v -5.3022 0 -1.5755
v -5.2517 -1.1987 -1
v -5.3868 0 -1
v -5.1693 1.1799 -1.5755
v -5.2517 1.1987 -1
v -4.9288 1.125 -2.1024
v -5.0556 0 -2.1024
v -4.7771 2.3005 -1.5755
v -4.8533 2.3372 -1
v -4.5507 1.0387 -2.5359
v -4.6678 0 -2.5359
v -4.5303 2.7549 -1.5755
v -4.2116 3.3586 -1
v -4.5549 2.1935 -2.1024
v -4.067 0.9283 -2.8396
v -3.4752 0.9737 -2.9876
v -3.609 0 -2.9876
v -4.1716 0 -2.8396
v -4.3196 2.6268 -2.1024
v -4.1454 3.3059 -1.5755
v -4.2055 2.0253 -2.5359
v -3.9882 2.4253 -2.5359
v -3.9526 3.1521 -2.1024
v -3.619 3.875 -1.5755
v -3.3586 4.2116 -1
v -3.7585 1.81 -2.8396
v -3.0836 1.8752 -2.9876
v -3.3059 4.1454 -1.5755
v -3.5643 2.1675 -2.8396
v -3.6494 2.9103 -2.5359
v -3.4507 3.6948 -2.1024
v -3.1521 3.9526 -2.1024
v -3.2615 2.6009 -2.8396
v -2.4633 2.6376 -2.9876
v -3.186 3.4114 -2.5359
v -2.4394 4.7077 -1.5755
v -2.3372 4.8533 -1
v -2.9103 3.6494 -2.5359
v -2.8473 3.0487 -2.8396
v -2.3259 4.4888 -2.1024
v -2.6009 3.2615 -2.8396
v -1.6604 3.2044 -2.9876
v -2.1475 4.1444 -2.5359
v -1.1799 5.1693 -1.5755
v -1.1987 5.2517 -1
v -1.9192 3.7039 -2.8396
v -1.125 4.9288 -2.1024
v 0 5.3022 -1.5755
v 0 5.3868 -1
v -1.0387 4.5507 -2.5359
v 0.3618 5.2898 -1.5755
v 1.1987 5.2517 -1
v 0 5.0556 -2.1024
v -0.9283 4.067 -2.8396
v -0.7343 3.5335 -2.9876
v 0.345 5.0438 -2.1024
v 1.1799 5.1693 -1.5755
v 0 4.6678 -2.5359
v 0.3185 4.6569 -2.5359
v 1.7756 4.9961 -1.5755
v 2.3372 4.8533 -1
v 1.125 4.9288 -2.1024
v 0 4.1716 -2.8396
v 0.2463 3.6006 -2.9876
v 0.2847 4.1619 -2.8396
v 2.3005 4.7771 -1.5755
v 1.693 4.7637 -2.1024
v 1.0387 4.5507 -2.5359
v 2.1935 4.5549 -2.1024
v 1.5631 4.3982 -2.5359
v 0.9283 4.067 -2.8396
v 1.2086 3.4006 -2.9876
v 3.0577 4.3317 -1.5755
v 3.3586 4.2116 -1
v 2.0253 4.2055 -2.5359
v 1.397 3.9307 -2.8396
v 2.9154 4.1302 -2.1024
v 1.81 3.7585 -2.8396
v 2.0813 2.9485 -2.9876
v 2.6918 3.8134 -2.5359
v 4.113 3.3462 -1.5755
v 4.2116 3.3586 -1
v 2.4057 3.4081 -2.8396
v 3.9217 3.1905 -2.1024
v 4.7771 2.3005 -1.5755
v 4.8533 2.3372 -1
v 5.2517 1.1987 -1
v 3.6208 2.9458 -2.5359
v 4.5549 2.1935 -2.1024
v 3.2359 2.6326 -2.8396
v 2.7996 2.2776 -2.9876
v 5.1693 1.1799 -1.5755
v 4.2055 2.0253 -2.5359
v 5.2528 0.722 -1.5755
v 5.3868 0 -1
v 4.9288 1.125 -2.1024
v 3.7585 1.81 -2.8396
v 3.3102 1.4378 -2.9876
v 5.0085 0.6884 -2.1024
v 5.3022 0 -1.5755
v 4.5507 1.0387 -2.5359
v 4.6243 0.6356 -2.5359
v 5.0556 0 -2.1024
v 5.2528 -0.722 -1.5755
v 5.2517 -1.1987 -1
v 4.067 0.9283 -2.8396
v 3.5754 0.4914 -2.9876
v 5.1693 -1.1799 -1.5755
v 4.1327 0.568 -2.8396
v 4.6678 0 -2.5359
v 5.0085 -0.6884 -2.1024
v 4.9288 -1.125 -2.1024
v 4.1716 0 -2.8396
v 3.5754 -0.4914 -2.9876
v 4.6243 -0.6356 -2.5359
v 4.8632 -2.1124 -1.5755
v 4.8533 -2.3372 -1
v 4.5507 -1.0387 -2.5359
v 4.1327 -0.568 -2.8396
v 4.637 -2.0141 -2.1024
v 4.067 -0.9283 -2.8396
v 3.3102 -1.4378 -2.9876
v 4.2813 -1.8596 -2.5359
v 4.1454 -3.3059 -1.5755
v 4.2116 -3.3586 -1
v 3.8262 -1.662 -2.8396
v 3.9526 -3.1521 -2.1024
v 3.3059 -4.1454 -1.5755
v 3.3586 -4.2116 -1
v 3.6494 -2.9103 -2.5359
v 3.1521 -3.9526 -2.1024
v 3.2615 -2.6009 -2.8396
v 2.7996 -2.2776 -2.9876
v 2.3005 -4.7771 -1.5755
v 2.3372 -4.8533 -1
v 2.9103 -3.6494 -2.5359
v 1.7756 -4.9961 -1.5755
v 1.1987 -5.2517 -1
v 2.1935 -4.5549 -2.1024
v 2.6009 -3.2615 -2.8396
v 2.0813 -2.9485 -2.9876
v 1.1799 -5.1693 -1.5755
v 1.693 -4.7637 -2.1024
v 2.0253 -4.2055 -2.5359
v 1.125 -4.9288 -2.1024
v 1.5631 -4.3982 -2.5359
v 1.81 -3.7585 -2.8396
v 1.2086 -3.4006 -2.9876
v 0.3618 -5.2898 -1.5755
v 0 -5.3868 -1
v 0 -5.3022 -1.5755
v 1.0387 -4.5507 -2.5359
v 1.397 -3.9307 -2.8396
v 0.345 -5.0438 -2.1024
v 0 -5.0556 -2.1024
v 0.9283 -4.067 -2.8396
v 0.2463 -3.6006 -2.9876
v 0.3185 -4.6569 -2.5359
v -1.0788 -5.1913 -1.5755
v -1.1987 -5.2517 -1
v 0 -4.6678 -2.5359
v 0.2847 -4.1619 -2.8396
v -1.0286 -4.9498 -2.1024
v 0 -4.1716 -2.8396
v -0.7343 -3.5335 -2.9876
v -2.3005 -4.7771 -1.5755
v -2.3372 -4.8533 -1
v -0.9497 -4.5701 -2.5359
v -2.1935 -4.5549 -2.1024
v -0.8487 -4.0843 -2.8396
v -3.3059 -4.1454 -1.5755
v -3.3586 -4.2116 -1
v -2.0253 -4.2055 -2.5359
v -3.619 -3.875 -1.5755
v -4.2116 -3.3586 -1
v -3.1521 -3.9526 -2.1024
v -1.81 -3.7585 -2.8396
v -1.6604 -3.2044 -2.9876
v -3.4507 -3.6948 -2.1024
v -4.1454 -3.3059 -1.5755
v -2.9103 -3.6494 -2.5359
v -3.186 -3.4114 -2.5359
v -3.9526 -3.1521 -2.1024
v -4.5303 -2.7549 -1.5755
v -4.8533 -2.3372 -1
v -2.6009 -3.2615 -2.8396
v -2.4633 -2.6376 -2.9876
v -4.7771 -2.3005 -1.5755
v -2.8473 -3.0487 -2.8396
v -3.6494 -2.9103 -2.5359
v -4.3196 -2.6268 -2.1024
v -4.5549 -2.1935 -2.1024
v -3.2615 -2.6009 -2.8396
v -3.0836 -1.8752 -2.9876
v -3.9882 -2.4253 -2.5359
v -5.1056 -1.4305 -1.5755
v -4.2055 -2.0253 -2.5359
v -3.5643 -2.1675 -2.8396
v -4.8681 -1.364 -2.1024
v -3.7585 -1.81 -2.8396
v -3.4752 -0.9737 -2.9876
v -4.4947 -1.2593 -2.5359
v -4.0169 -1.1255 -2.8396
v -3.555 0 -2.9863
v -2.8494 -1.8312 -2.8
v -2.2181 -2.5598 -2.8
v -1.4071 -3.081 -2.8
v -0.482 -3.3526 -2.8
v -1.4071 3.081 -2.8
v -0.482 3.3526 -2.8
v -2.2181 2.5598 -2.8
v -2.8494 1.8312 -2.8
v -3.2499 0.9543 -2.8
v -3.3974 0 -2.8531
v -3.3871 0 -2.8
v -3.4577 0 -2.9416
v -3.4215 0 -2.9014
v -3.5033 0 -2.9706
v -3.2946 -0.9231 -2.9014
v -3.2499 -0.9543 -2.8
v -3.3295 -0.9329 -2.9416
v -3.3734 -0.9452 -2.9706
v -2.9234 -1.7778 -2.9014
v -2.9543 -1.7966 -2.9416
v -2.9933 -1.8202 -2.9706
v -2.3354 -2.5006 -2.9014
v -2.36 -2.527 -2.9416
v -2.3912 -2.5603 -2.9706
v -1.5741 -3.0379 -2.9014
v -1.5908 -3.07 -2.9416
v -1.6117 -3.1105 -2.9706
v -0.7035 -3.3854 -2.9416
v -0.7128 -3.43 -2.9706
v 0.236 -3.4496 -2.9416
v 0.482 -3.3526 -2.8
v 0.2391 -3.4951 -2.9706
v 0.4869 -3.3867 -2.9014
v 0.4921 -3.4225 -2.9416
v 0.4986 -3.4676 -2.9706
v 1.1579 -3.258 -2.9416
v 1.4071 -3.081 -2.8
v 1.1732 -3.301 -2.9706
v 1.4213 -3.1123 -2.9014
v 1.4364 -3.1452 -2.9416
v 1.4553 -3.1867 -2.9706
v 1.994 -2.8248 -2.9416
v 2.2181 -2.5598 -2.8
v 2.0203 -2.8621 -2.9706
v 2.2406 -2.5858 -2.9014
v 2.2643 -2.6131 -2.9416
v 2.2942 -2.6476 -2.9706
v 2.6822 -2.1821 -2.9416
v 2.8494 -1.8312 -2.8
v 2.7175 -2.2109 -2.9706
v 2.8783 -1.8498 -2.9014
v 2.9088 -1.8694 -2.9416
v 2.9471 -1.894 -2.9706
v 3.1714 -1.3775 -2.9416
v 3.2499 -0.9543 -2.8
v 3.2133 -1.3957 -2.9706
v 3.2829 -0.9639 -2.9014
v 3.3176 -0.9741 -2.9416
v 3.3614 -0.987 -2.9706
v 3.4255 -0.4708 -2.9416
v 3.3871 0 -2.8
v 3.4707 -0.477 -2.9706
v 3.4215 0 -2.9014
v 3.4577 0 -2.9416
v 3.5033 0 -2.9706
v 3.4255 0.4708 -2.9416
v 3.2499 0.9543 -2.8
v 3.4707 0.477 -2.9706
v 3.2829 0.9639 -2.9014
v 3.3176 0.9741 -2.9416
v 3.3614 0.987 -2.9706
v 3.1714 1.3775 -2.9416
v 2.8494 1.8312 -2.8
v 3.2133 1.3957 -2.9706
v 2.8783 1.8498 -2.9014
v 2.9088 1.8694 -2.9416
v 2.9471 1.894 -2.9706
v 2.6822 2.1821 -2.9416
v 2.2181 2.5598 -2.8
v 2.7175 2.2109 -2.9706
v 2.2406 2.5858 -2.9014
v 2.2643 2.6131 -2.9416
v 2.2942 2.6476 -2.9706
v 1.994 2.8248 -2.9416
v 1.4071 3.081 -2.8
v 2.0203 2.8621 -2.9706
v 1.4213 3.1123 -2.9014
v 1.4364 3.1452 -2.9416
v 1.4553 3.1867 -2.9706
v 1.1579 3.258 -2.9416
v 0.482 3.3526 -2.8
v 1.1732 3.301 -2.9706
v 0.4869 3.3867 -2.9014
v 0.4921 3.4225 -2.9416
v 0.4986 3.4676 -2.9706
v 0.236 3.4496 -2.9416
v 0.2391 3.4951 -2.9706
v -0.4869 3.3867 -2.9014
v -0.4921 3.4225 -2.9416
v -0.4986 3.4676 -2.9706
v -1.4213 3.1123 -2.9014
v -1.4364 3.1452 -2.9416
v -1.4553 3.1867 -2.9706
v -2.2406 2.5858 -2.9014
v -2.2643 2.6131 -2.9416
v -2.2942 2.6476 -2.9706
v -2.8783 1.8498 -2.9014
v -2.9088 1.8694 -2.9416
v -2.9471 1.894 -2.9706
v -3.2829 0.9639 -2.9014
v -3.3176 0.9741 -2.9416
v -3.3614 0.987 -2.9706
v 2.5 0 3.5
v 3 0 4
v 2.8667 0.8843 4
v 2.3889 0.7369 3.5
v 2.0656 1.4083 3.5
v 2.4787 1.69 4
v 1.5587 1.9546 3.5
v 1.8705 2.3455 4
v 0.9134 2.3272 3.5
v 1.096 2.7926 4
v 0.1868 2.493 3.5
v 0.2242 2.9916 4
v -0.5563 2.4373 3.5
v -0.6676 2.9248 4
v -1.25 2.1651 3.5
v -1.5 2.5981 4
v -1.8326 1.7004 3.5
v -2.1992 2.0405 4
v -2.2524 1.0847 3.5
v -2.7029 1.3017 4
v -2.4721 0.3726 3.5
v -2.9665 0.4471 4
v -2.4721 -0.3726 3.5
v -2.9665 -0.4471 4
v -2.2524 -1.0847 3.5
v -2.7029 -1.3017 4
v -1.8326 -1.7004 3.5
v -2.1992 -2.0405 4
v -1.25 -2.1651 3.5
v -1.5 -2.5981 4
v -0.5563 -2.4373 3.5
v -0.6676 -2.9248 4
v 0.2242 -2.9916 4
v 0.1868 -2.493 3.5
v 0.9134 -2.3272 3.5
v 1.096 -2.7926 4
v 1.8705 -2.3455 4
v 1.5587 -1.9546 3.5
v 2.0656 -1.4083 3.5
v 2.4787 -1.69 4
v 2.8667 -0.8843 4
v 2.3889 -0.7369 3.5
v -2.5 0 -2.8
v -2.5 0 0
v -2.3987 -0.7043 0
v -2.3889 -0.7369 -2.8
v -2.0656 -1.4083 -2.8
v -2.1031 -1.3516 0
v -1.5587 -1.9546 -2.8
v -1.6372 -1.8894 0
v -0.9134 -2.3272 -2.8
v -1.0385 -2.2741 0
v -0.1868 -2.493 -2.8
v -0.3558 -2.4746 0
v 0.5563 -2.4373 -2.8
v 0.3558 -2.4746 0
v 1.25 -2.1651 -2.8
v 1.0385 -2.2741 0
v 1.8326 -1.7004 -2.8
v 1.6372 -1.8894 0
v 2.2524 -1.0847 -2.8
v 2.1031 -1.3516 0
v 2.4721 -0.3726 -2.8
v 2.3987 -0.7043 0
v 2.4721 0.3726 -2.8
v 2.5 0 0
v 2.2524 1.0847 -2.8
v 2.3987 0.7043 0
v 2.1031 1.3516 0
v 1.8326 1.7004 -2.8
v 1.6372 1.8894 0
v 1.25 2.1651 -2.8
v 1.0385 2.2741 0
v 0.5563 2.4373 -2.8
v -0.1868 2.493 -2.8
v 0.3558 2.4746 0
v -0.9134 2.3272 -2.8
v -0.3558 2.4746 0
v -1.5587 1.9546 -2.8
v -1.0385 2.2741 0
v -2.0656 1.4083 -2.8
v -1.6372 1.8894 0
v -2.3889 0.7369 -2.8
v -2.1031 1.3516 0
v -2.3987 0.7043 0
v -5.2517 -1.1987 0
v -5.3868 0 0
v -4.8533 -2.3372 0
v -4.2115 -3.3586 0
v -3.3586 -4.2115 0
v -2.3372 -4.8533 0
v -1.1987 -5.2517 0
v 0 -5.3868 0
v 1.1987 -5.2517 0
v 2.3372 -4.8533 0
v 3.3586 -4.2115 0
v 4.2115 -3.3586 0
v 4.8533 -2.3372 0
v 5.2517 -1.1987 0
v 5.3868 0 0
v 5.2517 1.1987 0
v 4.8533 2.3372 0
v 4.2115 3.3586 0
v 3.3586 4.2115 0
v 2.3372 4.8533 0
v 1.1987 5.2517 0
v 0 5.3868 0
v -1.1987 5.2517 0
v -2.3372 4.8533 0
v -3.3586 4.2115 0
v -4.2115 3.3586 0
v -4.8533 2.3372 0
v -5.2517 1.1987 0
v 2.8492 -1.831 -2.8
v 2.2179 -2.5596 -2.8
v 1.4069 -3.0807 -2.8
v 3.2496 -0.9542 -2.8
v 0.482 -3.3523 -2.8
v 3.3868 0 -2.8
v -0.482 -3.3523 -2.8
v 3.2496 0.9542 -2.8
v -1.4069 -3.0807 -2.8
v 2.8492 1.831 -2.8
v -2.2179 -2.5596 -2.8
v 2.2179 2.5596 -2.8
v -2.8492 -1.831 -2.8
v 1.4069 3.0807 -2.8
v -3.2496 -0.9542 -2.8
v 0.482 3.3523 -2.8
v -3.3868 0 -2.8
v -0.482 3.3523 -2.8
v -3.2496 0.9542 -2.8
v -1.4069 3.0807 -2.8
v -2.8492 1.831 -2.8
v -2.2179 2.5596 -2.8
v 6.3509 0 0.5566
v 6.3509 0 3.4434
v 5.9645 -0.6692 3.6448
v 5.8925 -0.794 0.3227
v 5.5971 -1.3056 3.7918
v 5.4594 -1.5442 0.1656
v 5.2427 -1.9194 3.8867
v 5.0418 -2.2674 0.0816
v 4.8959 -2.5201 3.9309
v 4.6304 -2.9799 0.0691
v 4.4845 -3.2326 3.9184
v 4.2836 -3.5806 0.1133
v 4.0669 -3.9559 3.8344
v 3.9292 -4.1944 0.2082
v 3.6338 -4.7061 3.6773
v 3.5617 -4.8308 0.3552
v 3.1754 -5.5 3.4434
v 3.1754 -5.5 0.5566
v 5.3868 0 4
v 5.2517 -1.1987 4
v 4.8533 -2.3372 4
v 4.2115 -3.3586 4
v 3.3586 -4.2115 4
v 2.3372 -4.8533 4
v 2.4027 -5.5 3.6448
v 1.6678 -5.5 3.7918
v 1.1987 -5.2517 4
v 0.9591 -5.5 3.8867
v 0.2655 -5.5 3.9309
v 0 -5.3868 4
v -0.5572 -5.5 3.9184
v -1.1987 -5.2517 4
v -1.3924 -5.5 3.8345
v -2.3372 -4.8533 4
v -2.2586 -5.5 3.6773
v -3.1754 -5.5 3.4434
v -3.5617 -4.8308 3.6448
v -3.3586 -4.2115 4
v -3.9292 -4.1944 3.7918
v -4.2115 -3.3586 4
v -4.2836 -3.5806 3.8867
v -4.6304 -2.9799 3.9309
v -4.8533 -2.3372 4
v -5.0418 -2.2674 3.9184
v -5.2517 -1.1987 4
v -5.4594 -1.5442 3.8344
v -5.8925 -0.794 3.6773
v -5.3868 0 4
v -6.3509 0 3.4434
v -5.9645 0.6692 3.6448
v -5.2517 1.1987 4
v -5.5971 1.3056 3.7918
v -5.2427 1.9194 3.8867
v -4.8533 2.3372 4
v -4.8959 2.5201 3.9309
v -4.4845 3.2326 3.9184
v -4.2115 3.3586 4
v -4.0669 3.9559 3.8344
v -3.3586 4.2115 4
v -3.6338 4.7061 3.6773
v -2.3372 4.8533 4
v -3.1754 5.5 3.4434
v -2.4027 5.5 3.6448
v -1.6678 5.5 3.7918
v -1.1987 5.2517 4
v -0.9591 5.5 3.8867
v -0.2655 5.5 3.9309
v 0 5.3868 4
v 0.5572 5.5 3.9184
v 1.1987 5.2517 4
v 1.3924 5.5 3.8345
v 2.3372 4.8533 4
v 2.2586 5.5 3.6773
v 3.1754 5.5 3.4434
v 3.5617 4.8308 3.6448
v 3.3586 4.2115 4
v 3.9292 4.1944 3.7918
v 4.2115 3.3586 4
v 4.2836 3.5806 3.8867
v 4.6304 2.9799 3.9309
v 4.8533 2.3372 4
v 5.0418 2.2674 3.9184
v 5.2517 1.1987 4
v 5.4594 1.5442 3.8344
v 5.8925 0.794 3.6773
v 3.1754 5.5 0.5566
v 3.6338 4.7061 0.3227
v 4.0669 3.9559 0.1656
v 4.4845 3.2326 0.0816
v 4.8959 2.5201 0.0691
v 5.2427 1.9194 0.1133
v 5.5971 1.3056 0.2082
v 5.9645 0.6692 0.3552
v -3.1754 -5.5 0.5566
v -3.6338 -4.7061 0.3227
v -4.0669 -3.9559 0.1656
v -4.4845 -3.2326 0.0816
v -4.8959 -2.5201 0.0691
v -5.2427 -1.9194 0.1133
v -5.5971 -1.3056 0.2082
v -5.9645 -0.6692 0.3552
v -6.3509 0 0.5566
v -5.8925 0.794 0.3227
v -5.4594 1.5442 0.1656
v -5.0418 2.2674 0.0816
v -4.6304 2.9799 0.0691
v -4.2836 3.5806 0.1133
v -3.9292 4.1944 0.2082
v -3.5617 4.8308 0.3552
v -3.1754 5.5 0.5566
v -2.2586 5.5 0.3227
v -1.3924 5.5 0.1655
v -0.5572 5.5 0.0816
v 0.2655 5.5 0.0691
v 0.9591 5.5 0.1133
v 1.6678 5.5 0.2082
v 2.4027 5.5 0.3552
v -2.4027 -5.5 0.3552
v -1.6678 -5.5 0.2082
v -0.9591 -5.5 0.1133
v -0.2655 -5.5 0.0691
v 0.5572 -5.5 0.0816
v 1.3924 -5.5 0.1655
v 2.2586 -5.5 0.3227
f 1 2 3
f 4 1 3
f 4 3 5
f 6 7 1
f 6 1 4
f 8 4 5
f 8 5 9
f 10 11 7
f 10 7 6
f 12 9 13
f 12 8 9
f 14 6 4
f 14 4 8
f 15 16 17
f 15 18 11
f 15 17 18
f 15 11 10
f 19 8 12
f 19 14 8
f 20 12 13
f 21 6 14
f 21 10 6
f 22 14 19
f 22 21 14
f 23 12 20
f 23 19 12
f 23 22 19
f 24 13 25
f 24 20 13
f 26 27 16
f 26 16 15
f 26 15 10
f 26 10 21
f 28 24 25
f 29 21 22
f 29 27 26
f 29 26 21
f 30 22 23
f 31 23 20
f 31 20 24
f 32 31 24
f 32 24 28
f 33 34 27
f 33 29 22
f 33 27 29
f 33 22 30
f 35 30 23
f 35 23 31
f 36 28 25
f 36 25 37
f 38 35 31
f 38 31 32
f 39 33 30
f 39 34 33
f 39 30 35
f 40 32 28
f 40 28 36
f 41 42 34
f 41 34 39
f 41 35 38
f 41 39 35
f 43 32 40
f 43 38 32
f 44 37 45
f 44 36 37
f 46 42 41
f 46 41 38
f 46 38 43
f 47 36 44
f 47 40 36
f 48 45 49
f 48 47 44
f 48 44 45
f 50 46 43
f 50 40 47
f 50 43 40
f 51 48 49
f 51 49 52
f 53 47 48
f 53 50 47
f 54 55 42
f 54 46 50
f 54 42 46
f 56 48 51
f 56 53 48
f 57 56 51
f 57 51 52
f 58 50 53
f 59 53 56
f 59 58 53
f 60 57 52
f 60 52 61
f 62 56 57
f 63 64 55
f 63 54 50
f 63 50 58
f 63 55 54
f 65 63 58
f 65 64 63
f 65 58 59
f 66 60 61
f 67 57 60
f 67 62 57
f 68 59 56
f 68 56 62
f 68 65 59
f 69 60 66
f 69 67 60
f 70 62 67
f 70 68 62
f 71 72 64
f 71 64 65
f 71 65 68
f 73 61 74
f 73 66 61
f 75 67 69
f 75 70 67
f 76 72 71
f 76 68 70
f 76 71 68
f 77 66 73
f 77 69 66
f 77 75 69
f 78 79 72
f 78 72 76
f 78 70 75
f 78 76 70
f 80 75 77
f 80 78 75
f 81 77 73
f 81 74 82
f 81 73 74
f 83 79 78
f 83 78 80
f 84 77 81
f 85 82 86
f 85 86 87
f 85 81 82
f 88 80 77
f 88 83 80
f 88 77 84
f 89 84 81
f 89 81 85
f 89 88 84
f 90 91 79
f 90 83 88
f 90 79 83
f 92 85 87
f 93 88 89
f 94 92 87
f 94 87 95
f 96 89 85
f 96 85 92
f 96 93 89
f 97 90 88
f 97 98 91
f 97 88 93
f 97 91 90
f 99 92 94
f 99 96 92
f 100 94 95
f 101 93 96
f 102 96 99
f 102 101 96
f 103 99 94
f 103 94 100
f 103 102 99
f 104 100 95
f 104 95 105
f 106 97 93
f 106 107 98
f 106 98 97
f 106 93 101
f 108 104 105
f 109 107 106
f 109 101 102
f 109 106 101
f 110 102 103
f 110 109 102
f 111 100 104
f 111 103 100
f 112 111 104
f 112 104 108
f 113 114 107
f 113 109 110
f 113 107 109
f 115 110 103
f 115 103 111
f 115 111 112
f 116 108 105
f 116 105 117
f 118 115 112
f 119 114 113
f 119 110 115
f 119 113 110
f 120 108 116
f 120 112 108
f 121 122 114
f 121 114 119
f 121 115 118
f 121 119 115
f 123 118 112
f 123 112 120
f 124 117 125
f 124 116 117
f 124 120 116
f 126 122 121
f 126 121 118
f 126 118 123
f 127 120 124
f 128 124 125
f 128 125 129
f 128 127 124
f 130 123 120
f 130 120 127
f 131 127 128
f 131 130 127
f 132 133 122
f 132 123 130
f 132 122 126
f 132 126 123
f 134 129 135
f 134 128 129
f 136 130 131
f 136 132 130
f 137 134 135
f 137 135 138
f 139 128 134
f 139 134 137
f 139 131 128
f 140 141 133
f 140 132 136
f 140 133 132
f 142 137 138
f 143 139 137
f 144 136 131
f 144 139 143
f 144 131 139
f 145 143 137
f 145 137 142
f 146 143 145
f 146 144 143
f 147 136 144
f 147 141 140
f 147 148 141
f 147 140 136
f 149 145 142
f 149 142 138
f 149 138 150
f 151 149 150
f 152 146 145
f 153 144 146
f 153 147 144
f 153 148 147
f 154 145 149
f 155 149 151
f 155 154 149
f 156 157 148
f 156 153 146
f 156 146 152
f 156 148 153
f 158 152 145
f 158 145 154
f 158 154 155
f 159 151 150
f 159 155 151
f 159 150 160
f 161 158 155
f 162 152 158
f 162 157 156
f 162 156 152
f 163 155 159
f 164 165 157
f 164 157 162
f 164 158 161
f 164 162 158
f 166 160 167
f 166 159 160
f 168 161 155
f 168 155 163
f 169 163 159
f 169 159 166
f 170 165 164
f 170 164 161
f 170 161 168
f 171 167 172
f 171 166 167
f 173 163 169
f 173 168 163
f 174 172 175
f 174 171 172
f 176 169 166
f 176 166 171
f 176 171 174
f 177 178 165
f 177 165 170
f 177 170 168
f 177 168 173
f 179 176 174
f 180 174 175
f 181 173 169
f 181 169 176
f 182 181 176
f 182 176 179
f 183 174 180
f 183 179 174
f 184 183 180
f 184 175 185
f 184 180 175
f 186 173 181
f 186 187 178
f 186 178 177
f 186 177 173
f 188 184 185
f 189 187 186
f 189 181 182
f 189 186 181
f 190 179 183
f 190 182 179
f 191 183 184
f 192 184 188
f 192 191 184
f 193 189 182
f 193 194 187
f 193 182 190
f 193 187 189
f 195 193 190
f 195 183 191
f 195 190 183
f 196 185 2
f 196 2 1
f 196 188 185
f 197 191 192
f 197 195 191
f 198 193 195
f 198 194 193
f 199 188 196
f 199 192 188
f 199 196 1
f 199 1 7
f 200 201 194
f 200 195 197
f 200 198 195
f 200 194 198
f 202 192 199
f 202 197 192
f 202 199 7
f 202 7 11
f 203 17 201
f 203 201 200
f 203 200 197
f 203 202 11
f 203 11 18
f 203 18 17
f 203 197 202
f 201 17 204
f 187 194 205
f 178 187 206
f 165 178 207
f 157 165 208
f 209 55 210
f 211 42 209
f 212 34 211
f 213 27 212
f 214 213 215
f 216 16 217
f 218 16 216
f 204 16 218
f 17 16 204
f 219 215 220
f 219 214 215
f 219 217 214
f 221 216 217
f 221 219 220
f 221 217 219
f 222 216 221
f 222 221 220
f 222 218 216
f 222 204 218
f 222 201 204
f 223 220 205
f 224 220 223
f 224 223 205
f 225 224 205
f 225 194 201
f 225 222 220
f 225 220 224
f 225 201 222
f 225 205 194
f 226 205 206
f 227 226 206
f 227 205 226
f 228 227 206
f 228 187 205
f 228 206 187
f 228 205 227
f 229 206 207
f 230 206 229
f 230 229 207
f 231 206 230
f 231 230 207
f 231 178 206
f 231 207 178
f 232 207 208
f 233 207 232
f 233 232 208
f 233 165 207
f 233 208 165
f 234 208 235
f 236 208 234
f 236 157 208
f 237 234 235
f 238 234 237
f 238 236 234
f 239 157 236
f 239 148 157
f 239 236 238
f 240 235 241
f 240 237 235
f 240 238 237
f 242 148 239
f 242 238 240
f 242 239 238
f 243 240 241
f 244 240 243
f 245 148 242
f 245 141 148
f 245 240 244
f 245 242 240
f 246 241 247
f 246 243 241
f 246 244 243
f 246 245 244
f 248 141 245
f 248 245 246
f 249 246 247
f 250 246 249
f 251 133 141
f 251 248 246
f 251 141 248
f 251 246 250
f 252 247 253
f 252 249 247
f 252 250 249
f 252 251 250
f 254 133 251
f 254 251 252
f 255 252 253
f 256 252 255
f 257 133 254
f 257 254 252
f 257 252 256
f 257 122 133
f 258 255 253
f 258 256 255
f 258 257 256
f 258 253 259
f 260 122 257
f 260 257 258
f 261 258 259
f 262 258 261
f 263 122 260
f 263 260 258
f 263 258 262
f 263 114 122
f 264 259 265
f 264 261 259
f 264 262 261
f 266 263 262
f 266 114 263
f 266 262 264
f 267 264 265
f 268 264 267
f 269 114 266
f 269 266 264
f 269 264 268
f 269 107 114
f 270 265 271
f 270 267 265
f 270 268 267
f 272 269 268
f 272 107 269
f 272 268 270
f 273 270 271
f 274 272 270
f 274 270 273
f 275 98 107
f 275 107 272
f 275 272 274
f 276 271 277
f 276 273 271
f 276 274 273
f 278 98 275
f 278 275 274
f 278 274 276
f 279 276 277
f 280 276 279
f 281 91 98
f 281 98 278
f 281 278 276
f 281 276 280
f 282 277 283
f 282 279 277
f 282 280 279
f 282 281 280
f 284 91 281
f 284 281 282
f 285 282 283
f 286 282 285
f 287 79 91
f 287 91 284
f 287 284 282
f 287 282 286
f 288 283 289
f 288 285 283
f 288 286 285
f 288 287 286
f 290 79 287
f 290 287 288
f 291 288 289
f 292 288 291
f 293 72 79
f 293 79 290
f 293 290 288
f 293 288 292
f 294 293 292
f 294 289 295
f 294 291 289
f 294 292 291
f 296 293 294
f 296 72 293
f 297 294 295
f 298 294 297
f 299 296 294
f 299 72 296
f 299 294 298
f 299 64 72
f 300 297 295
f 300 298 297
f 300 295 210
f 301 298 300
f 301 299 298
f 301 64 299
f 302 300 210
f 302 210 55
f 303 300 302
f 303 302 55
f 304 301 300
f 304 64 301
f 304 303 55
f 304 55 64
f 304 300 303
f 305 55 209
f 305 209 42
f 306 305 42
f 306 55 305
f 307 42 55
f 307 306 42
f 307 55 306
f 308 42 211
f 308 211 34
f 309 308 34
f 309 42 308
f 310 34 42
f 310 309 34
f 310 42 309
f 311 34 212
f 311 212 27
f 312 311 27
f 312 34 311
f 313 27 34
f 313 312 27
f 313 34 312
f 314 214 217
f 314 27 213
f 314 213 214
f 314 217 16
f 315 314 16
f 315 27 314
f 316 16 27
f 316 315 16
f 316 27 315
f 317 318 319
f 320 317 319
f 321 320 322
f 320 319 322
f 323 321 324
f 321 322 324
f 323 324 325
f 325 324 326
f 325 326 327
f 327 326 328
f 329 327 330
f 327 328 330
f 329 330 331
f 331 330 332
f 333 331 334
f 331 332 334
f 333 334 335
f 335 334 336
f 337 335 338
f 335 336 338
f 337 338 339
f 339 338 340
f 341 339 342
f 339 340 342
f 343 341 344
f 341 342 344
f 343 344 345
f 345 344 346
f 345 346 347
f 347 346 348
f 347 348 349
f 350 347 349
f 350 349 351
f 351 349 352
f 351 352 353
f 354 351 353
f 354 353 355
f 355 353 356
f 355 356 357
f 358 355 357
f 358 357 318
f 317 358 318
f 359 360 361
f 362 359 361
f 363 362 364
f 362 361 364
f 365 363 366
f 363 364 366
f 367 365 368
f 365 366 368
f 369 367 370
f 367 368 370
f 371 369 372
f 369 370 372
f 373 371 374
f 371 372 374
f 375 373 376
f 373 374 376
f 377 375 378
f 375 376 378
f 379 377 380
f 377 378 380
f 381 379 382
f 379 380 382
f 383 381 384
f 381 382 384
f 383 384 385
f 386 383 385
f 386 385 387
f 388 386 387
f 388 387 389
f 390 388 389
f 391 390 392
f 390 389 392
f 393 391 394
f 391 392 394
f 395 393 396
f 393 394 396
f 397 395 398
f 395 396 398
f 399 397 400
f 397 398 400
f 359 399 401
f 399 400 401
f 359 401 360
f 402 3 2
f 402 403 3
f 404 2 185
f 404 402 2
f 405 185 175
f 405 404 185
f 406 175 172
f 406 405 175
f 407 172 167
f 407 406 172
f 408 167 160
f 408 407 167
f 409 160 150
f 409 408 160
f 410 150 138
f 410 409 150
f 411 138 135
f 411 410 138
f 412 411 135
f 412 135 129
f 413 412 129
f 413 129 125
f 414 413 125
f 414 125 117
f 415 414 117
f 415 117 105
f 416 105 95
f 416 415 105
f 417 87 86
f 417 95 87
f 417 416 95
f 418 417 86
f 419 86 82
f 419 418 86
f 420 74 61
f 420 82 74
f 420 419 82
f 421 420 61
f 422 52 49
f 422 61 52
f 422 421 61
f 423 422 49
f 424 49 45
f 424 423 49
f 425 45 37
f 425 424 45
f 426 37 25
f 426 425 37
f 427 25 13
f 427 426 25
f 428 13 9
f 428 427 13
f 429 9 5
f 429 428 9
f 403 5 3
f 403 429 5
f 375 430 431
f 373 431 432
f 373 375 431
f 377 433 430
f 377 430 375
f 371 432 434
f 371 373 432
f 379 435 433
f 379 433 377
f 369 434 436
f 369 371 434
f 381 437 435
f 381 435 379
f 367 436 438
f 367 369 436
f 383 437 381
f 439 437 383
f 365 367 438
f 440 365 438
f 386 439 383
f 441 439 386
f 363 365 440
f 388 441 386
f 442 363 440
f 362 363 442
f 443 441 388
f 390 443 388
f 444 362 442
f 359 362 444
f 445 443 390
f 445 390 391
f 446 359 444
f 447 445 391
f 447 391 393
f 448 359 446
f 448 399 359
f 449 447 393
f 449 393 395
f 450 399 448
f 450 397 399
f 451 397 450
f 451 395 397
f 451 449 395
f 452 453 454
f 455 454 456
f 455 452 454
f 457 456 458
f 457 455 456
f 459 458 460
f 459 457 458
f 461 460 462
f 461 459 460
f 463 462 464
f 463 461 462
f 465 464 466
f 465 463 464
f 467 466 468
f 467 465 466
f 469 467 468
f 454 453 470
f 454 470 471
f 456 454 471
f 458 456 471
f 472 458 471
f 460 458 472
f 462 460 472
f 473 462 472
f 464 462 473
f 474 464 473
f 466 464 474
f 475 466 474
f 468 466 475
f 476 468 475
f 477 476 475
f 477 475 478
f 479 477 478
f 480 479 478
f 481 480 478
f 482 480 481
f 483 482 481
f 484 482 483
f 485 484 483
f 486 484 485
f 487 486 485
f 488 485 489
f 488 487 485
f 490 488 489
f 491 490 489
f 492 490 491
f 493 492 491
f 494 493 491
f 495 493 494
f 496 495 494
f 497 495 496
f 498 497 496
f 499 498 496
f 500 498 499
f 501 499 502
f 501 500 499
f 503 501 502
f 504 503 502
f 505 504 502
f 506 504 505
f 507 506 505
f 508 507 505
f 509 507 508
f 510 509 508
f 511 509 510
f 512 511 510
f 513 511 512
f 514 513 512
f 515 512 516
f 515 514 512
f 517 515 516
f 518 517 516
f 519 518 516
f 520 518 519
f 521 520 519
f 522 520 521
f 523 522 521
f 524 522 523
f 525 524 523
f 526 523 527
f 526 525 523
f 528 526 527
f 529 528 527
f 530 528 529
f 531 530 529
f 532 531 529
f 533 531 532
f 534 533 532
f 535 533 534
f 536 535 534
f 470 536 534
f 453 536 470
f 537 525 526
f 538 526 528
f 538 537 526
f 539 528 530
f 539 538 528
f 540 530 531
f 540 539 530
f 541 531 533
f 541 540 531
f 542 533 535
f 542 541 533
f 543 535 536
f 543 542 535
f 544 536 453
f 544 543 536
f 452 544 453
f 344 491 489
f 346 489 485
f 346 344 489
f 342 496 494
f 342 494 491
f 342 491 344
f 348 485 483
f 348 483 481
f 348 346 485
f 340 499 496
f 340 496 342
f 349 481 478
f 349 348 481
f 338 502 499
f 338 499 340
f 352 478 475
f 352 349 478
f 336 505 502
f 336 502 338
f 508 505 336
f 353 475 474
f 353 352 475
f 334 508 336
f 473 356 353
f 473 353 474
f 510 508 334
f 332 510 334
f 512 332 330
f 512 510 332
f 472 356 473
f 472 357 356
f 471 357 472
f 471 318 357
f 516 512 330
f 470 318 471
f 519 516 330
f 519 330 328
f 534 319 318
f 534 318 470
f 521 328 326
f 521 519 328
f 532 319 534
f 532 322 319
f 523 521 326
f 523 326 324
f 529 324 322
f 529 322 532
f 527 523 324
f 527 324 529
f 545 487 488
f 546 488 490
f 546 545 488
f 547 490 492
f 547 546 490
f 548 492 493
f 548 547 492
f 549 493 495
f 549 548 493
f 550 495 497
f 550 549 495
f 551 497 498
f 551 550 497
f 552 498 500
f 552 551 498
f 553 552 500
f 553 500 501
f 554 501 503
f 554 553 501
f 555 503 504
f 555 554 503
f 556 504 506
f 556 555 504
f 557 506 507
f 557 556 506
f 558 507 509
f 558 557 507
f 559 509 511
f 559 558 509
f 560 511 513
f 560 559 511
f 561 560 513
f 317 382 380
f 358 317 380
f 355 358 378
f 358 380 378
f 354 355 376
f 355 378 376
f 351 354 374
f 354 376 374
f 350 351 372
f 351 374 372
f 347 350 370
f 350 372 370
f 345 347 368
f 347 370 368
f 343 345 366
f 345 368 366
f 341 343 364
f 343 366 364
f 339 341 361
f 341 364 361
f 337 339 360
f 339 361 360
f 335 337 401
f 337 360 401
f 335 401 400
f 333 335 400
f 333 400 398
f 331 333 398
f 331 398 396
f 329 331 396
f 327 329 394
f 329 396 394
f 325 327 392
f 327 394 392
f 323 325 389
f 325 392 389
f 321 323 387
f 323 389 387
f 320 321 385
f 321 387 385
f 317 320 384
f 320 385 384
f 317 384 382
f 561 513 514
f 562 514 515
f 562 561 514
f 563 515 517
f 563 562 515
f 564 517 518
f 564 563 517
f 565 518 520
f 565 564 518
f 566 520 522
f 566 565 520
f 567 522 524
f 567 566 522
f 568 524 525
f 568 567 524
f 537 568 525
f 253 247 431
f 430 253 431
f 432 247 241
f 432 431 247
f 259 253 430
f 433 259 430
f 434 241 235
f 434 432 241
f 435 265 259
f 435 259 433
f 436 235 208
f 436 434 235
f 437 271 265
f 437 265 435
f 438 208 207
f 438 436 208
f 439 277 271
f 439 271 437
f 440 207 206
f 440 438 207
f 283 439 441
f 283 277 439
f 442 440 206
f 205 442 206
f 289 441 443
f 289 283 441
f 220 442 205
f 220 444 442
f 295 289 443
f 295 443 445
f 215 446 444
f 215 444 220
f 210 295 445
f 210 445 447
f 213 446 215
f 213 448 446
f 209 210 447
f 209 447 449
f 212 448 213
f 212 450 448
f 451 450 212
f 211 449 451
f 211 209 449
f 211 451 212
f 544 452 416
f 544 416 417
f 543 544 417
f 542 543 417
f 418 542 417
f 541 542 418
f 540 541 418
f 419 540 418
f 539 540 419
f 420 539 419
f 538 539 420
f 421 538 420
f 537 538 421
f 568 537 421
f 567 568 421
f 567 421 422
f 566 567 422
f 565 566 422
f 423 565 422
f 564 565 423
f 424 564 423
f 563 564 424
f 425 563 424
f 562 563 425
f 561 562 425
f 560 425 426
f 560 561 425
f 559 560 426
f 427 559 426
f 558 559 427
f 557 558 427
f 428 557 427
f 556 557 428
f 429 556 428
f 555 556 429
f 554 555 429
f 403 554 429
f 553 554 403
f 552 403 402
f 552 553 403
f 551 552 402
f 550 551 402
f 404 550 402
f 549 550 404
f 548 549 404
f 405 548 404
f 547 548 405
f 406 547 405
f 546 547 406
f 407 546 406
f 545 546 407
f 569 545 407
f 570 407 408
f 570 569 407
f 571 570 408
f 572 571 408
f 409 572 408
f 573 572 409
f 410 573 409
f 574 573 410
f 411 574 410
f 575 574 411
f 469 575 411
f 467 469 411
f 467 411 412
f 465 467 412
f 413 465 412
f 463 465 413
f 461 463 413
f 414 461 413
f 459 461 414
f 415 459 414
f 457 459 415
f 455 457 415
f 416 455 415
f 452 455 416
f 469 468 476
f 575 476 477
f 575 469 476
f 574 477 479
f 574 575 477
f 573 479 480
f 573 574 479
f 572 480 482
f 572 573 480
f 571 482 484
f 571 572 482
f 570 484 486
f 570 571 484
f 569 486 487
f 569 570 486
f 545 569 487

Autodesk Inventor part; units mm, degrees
ref_plane "YZ Plane" through (0, 0, 0) normal (1, 0, 0) x (0, 1, 0)
ref_plane "XZ Plane" through (0, 0, 0) normal (0, 1, 0) x (-1, 0, 0)
ref_plane "XY Plane" through (0, 0, 0) normal (0, 0, 1) x (1, 0, 0)
sketch "Эскиз1" plane through (0, 0, 0) normal (0, 0, 1) x (1, 0, 0)
  circle A0 centre (0, 0) radius 2.5
  line L0 (6.3509, 0) -> (3.1754, -5.5)
  line L1 (3.1754, -5.5) -> (-3.1754, -5.5)
  line L2 (-3.1754, -5.5) -> (-6.3509, 0)
  line L3 (-6.3509, 0) -> (-3.1754, 5.5)
  line L4 (-3.1754, 5.5) -> (3.1754, 5.5)
  line L5 (3.1754, 5.5) -> (6.3509, 0)
  dimension "d0" = 5
  dimension "d21" = 3
extrude "Выдавливание1" add sketch "Эскиз1" along normal blind 4
sketch "Эскиз2" plane through (0, 0, 0) normal (0, 1, 0) x (-1, 0, 0)
  line L0 (0, 0) -> (0, 12.9838)
  line L1 (-3.1754, 0) -> (-6.3509, 0) construction
  line L2 (-6.3509, 0) -> (-6.3509, 4) construction
  line L3 (-6.3509, 4) -> (-3.1754, 4) construction
  line L4 (-1.9952, -1.9581) -> (-8.8509, 2)
  line L5 (-8.8509, 2) -> (-1.9952, 5.9581)
  line L6 (-1.9952, 5.9581) -> (-9.8509, 5.9581)
  line L7 (-9.8509, 5.9581) -> (-9.8509, -1.9581)
  line L8 (-9.8509, -1.9581) -> (-1.9952, -1.9581)
  line L9 (-6.3509, 2) -> (-29.2681, 2) construction
  point P0 (-9.8509, 2)
  dimension "d4" = 60
  dimension "d5" = 1
  dimension "d6" = 3.5
revolve "Вращение1" cut sketch "Эскиз2" angle 360 about axis through (0, 0, 0) along (0, 0, 1)
sketch "Эскиз3" plane through (0, 0, 0) normal (0, 0, -1) x (-1, 0, 0)
  circle A0 centre (0, 0) radius 2.5 projected
  circle A1 centre (0, 0) radius 5.3868 projected
  circle A2 centre (0, 0) radius 5.3868
extrude "Выдавливание2" add sketch "Эскиз3" along normal blind 3
fillet "Сопряжение1" radius 2 1 edges at (5.3868, 0, -3)
chamfer "Фаска2" distance 0.5 angle 45 1 edges at (-2.5, 0, 4)
sketch "Sketch5" plane through (0, 0, -3) normal (0, 0, -1) x (-1, 0, 0)
  circle A0 centre (0, 0) radius 2.5 projected
  circle A1 centre (0, 0) radius 3.3868 projected
extrude "Extrusion4" cut sketch "Sketch5" against normal blind 0.2
fillet "Fillet3" radius 0.2 1 edges at (3.3868, 0, -3)
properties part number "paris_nut"
